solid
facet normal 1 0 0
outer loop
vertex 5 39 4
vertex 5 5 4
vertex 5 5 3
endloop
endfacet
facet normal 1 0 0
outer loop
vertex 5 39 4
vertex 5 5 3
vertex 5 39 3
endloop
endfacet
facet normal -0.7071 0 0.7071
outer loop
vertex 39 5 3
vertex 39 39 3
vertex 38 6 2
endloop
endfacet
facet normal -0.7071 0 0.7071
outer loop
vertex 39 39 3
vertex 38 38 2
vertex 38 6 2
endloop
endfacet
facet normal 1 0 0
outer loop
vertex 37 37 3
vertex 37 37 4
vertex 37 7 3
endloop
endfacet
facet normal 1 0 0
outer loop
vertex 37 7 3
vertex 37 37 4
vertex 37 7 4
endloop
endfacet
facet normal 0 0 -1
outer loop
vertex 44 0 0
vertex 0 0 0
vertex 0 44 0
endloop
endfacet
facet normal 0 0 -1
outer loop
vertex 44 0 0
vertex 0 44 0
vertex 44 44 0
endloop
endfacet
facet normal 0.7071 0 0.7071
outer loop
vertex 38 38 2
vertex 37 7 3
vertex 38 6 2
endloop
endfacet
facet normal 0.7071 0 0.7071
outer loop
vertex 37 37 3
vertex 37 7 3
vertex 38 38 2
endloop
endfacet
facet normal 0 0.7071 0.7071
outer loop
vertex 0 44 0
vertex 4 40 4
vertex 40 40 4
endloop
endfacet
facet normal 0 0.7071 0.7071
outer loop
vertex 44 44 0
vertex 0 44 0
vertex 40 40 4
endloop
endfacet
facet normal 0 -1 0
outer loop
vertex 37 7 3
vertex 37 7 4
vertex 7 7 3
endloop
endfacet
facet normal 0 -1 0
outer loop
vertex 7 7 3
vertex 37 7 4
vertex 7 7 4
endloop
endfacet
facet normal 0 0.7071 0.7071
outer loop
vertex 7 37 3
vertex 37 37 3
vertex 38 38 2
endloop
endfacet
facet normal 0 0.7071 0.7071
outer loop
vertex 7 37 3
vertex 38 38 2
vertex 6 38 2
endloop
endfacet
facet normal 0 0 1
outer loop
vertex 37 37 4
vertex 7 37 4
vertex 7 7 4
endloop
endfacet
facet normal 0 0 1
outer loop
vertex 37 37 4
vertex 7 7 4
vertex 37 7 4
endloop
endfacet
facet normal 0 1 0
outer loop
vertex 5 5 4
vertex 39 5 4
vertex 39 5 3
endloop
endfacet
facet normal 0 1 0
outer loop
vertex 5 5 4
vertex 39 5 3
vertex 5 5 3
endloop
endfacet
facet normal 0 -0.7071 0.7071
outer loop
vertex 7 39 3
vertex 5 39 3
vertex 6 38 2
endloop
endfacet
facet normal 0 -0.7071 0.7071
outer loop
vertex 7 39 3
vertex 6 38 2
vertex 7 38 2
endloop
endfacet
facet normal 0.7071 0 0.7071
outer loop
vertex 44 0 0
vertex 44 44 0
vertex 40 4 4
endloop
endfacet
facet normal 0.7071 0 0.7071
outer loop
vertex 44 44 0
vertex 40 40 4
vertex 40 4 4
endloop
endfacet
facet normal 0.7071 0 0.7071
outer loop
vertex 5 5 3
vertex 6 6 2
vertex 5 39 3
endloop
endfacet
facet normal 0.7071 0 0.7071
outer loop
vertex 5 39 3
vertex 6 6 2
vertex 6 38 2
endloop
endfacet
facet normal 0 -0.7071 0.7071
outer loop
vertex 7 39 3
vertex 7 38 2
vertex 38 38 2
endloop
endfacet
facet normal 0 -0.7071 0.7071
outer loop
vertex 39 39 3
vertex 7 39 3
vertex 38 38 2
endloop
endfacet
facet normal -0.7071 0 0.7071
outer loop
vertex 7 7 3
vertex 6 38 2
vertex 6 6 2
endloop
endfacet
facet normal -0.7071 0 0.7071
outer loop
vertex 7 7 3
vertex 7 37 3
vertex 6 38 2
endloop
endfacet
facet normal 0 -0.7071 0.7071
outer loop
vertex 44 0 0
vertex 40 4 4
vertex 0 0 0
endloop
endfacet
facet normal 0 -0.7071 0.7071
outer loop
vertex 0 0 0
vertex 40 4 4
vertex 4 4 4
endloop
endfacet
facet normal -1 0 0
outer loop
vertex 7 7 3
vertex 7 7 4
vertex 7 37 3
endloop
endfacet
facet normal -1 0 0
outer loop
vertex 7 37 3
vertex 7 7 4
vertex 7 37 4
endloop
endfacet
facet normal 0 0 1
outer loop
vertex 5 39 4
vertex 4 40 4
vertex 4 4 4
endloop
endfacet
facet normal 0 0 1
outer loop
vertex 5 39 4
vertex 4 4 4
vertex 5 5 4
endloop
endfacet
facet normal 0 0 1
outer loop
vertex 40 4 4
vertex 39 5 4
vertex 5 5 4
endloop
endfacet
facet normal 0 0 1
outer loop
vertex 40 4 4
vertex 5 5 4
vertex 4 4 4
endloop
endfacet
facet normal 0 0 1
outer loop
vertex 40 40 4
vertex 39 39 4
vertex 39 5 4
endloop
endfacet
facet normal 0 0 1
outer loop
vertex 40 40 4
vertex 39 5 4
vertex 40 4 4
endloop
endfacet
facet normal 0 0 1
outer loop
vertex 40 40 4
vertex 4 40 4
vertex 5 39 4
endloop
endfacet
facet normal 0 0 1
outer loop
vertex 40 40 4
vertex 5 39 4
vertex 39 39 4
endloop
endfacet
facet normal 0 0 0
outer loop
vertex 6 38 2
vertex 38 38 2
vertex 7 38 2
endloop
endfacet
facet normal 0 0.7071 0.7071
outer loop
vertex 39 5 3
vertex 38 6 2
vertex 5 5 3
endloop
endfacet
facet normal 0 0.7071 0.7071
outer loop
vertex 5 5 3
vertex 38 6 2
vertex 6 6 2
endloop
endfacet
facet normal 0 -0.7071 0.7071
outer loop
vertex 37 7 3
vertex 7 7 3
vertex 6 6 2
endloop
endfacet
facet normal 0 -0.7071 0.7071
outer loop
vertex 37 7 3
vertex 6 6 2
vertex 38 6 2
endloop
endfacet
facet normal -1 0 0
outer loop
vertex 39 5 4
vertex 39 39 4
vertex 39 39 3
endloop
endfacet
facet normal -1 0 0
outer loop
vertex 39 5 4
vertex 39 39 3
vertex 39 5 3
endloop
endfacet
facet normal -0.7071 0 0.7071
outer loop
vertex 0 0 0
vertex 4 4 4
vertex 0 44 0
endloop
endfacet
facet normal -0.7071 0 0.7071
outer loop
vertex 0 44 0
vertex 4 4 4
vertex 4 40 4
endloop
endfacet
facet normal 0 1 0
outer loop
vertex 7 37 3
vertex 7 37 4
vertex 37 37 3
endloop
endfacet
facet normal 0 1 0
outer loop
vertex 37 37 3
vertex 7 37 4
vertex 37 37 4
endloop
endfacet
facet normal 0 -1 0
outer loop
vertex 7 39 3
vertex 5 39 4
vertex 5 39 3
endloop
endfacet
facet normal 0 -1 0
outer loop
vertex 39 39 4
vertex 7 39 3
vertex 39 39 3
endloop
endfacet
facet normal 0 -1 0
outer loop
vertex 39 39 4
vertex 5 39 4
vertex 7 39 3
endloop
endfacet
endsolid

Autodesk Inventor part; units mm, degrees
ref_plane "YZ Plane" through (0, 0, 0) normal (1, 0, 0) x (0, 1, 0)
ref_plane "XZ Plane" through (0, 0, 0) normal (0, 1, 0) x (-1, 0, 0)
ref_plane "XY Plane" through (0, 0, 0) normal (0, 0, 1) x (1, 0, 0)
sketch "Sketch1" plane through (0, 0, 0) normal (0, 0, 1) x (1, 0, 0)
  line L0 (0, 0) -> (44, 0)
  line L1 (44, 0) -> (44, 44)
  line L2 (44, 44) -> (0, 44)
  line L3 (0, 44) -> (0, 0)
  dimension "d0" = 44
  dimension "d1" = 44
extrude "Extrusion1" add sketch "Sketch1" along normal blind 4
chamfer "Chamfer1" distance 4 angle 45 4 edges at (22, 44, 4) (44, 22, 4) (22, 0, 4) (0, 22, 4)
sketch "Sketch2" plane through (0, 0, 4) normal (0, 0, 1) x (1, 0, 0)
  line L0 (40, 4) -> (4, 4) projected
  line L1 (40, 40) -> (40, 4) projected
  line L2 (4, 40) -> (40, 40) projected
  line L3 (4, 4) -> (4, 40) projected
  line L4 (4, 40) -> (40, 40) projected
  line L5 (4, 40) -> (5, 40)
  line L6 (5, 40) -> (5, 39)
  line L7 (5, 39) -> (39, 39)
  line L8 (39, 39) -> (39, 5)
  line L9 (39, 5) -> (5, 5)
  line L10 (5, 5) -> (5, 39)
  line L11 (5, 39) -> (7, 39)
  line L12 (7, 39) -> (7, 37)
  line L13 (7, 37) -> (37, 37)
  line L14 (37, 37) -> (37, 7)
  line L15 (37, 7) -> (7, 7)
  line L16 (7, 7) -> (7, 37)
  point P0 (0, 0)
  dimension "d7" = 1
  dimension "d8" = 1
  dimension "d9" = 34
  dimension "d10" = 34
  dimension "d11" = 2
  dimension "d12" = 2
  dimension "d13" = 30
  dimension "d14" = 30
extrude "Extrusion2" cut sketch "Sketch2" against normal blind 2 contours L7 L8 L9 L10
chamfer "Chamfer2" distance 1 angle 45 8 edges at (22, 37, 2) (22, 39, 2) (5, 22, 2) (22, 7, 2) (7, 22, 2) (22, 5, 2) (37, 22, 2) (39, 22, 2)
properties part number "clear-square-notched"
